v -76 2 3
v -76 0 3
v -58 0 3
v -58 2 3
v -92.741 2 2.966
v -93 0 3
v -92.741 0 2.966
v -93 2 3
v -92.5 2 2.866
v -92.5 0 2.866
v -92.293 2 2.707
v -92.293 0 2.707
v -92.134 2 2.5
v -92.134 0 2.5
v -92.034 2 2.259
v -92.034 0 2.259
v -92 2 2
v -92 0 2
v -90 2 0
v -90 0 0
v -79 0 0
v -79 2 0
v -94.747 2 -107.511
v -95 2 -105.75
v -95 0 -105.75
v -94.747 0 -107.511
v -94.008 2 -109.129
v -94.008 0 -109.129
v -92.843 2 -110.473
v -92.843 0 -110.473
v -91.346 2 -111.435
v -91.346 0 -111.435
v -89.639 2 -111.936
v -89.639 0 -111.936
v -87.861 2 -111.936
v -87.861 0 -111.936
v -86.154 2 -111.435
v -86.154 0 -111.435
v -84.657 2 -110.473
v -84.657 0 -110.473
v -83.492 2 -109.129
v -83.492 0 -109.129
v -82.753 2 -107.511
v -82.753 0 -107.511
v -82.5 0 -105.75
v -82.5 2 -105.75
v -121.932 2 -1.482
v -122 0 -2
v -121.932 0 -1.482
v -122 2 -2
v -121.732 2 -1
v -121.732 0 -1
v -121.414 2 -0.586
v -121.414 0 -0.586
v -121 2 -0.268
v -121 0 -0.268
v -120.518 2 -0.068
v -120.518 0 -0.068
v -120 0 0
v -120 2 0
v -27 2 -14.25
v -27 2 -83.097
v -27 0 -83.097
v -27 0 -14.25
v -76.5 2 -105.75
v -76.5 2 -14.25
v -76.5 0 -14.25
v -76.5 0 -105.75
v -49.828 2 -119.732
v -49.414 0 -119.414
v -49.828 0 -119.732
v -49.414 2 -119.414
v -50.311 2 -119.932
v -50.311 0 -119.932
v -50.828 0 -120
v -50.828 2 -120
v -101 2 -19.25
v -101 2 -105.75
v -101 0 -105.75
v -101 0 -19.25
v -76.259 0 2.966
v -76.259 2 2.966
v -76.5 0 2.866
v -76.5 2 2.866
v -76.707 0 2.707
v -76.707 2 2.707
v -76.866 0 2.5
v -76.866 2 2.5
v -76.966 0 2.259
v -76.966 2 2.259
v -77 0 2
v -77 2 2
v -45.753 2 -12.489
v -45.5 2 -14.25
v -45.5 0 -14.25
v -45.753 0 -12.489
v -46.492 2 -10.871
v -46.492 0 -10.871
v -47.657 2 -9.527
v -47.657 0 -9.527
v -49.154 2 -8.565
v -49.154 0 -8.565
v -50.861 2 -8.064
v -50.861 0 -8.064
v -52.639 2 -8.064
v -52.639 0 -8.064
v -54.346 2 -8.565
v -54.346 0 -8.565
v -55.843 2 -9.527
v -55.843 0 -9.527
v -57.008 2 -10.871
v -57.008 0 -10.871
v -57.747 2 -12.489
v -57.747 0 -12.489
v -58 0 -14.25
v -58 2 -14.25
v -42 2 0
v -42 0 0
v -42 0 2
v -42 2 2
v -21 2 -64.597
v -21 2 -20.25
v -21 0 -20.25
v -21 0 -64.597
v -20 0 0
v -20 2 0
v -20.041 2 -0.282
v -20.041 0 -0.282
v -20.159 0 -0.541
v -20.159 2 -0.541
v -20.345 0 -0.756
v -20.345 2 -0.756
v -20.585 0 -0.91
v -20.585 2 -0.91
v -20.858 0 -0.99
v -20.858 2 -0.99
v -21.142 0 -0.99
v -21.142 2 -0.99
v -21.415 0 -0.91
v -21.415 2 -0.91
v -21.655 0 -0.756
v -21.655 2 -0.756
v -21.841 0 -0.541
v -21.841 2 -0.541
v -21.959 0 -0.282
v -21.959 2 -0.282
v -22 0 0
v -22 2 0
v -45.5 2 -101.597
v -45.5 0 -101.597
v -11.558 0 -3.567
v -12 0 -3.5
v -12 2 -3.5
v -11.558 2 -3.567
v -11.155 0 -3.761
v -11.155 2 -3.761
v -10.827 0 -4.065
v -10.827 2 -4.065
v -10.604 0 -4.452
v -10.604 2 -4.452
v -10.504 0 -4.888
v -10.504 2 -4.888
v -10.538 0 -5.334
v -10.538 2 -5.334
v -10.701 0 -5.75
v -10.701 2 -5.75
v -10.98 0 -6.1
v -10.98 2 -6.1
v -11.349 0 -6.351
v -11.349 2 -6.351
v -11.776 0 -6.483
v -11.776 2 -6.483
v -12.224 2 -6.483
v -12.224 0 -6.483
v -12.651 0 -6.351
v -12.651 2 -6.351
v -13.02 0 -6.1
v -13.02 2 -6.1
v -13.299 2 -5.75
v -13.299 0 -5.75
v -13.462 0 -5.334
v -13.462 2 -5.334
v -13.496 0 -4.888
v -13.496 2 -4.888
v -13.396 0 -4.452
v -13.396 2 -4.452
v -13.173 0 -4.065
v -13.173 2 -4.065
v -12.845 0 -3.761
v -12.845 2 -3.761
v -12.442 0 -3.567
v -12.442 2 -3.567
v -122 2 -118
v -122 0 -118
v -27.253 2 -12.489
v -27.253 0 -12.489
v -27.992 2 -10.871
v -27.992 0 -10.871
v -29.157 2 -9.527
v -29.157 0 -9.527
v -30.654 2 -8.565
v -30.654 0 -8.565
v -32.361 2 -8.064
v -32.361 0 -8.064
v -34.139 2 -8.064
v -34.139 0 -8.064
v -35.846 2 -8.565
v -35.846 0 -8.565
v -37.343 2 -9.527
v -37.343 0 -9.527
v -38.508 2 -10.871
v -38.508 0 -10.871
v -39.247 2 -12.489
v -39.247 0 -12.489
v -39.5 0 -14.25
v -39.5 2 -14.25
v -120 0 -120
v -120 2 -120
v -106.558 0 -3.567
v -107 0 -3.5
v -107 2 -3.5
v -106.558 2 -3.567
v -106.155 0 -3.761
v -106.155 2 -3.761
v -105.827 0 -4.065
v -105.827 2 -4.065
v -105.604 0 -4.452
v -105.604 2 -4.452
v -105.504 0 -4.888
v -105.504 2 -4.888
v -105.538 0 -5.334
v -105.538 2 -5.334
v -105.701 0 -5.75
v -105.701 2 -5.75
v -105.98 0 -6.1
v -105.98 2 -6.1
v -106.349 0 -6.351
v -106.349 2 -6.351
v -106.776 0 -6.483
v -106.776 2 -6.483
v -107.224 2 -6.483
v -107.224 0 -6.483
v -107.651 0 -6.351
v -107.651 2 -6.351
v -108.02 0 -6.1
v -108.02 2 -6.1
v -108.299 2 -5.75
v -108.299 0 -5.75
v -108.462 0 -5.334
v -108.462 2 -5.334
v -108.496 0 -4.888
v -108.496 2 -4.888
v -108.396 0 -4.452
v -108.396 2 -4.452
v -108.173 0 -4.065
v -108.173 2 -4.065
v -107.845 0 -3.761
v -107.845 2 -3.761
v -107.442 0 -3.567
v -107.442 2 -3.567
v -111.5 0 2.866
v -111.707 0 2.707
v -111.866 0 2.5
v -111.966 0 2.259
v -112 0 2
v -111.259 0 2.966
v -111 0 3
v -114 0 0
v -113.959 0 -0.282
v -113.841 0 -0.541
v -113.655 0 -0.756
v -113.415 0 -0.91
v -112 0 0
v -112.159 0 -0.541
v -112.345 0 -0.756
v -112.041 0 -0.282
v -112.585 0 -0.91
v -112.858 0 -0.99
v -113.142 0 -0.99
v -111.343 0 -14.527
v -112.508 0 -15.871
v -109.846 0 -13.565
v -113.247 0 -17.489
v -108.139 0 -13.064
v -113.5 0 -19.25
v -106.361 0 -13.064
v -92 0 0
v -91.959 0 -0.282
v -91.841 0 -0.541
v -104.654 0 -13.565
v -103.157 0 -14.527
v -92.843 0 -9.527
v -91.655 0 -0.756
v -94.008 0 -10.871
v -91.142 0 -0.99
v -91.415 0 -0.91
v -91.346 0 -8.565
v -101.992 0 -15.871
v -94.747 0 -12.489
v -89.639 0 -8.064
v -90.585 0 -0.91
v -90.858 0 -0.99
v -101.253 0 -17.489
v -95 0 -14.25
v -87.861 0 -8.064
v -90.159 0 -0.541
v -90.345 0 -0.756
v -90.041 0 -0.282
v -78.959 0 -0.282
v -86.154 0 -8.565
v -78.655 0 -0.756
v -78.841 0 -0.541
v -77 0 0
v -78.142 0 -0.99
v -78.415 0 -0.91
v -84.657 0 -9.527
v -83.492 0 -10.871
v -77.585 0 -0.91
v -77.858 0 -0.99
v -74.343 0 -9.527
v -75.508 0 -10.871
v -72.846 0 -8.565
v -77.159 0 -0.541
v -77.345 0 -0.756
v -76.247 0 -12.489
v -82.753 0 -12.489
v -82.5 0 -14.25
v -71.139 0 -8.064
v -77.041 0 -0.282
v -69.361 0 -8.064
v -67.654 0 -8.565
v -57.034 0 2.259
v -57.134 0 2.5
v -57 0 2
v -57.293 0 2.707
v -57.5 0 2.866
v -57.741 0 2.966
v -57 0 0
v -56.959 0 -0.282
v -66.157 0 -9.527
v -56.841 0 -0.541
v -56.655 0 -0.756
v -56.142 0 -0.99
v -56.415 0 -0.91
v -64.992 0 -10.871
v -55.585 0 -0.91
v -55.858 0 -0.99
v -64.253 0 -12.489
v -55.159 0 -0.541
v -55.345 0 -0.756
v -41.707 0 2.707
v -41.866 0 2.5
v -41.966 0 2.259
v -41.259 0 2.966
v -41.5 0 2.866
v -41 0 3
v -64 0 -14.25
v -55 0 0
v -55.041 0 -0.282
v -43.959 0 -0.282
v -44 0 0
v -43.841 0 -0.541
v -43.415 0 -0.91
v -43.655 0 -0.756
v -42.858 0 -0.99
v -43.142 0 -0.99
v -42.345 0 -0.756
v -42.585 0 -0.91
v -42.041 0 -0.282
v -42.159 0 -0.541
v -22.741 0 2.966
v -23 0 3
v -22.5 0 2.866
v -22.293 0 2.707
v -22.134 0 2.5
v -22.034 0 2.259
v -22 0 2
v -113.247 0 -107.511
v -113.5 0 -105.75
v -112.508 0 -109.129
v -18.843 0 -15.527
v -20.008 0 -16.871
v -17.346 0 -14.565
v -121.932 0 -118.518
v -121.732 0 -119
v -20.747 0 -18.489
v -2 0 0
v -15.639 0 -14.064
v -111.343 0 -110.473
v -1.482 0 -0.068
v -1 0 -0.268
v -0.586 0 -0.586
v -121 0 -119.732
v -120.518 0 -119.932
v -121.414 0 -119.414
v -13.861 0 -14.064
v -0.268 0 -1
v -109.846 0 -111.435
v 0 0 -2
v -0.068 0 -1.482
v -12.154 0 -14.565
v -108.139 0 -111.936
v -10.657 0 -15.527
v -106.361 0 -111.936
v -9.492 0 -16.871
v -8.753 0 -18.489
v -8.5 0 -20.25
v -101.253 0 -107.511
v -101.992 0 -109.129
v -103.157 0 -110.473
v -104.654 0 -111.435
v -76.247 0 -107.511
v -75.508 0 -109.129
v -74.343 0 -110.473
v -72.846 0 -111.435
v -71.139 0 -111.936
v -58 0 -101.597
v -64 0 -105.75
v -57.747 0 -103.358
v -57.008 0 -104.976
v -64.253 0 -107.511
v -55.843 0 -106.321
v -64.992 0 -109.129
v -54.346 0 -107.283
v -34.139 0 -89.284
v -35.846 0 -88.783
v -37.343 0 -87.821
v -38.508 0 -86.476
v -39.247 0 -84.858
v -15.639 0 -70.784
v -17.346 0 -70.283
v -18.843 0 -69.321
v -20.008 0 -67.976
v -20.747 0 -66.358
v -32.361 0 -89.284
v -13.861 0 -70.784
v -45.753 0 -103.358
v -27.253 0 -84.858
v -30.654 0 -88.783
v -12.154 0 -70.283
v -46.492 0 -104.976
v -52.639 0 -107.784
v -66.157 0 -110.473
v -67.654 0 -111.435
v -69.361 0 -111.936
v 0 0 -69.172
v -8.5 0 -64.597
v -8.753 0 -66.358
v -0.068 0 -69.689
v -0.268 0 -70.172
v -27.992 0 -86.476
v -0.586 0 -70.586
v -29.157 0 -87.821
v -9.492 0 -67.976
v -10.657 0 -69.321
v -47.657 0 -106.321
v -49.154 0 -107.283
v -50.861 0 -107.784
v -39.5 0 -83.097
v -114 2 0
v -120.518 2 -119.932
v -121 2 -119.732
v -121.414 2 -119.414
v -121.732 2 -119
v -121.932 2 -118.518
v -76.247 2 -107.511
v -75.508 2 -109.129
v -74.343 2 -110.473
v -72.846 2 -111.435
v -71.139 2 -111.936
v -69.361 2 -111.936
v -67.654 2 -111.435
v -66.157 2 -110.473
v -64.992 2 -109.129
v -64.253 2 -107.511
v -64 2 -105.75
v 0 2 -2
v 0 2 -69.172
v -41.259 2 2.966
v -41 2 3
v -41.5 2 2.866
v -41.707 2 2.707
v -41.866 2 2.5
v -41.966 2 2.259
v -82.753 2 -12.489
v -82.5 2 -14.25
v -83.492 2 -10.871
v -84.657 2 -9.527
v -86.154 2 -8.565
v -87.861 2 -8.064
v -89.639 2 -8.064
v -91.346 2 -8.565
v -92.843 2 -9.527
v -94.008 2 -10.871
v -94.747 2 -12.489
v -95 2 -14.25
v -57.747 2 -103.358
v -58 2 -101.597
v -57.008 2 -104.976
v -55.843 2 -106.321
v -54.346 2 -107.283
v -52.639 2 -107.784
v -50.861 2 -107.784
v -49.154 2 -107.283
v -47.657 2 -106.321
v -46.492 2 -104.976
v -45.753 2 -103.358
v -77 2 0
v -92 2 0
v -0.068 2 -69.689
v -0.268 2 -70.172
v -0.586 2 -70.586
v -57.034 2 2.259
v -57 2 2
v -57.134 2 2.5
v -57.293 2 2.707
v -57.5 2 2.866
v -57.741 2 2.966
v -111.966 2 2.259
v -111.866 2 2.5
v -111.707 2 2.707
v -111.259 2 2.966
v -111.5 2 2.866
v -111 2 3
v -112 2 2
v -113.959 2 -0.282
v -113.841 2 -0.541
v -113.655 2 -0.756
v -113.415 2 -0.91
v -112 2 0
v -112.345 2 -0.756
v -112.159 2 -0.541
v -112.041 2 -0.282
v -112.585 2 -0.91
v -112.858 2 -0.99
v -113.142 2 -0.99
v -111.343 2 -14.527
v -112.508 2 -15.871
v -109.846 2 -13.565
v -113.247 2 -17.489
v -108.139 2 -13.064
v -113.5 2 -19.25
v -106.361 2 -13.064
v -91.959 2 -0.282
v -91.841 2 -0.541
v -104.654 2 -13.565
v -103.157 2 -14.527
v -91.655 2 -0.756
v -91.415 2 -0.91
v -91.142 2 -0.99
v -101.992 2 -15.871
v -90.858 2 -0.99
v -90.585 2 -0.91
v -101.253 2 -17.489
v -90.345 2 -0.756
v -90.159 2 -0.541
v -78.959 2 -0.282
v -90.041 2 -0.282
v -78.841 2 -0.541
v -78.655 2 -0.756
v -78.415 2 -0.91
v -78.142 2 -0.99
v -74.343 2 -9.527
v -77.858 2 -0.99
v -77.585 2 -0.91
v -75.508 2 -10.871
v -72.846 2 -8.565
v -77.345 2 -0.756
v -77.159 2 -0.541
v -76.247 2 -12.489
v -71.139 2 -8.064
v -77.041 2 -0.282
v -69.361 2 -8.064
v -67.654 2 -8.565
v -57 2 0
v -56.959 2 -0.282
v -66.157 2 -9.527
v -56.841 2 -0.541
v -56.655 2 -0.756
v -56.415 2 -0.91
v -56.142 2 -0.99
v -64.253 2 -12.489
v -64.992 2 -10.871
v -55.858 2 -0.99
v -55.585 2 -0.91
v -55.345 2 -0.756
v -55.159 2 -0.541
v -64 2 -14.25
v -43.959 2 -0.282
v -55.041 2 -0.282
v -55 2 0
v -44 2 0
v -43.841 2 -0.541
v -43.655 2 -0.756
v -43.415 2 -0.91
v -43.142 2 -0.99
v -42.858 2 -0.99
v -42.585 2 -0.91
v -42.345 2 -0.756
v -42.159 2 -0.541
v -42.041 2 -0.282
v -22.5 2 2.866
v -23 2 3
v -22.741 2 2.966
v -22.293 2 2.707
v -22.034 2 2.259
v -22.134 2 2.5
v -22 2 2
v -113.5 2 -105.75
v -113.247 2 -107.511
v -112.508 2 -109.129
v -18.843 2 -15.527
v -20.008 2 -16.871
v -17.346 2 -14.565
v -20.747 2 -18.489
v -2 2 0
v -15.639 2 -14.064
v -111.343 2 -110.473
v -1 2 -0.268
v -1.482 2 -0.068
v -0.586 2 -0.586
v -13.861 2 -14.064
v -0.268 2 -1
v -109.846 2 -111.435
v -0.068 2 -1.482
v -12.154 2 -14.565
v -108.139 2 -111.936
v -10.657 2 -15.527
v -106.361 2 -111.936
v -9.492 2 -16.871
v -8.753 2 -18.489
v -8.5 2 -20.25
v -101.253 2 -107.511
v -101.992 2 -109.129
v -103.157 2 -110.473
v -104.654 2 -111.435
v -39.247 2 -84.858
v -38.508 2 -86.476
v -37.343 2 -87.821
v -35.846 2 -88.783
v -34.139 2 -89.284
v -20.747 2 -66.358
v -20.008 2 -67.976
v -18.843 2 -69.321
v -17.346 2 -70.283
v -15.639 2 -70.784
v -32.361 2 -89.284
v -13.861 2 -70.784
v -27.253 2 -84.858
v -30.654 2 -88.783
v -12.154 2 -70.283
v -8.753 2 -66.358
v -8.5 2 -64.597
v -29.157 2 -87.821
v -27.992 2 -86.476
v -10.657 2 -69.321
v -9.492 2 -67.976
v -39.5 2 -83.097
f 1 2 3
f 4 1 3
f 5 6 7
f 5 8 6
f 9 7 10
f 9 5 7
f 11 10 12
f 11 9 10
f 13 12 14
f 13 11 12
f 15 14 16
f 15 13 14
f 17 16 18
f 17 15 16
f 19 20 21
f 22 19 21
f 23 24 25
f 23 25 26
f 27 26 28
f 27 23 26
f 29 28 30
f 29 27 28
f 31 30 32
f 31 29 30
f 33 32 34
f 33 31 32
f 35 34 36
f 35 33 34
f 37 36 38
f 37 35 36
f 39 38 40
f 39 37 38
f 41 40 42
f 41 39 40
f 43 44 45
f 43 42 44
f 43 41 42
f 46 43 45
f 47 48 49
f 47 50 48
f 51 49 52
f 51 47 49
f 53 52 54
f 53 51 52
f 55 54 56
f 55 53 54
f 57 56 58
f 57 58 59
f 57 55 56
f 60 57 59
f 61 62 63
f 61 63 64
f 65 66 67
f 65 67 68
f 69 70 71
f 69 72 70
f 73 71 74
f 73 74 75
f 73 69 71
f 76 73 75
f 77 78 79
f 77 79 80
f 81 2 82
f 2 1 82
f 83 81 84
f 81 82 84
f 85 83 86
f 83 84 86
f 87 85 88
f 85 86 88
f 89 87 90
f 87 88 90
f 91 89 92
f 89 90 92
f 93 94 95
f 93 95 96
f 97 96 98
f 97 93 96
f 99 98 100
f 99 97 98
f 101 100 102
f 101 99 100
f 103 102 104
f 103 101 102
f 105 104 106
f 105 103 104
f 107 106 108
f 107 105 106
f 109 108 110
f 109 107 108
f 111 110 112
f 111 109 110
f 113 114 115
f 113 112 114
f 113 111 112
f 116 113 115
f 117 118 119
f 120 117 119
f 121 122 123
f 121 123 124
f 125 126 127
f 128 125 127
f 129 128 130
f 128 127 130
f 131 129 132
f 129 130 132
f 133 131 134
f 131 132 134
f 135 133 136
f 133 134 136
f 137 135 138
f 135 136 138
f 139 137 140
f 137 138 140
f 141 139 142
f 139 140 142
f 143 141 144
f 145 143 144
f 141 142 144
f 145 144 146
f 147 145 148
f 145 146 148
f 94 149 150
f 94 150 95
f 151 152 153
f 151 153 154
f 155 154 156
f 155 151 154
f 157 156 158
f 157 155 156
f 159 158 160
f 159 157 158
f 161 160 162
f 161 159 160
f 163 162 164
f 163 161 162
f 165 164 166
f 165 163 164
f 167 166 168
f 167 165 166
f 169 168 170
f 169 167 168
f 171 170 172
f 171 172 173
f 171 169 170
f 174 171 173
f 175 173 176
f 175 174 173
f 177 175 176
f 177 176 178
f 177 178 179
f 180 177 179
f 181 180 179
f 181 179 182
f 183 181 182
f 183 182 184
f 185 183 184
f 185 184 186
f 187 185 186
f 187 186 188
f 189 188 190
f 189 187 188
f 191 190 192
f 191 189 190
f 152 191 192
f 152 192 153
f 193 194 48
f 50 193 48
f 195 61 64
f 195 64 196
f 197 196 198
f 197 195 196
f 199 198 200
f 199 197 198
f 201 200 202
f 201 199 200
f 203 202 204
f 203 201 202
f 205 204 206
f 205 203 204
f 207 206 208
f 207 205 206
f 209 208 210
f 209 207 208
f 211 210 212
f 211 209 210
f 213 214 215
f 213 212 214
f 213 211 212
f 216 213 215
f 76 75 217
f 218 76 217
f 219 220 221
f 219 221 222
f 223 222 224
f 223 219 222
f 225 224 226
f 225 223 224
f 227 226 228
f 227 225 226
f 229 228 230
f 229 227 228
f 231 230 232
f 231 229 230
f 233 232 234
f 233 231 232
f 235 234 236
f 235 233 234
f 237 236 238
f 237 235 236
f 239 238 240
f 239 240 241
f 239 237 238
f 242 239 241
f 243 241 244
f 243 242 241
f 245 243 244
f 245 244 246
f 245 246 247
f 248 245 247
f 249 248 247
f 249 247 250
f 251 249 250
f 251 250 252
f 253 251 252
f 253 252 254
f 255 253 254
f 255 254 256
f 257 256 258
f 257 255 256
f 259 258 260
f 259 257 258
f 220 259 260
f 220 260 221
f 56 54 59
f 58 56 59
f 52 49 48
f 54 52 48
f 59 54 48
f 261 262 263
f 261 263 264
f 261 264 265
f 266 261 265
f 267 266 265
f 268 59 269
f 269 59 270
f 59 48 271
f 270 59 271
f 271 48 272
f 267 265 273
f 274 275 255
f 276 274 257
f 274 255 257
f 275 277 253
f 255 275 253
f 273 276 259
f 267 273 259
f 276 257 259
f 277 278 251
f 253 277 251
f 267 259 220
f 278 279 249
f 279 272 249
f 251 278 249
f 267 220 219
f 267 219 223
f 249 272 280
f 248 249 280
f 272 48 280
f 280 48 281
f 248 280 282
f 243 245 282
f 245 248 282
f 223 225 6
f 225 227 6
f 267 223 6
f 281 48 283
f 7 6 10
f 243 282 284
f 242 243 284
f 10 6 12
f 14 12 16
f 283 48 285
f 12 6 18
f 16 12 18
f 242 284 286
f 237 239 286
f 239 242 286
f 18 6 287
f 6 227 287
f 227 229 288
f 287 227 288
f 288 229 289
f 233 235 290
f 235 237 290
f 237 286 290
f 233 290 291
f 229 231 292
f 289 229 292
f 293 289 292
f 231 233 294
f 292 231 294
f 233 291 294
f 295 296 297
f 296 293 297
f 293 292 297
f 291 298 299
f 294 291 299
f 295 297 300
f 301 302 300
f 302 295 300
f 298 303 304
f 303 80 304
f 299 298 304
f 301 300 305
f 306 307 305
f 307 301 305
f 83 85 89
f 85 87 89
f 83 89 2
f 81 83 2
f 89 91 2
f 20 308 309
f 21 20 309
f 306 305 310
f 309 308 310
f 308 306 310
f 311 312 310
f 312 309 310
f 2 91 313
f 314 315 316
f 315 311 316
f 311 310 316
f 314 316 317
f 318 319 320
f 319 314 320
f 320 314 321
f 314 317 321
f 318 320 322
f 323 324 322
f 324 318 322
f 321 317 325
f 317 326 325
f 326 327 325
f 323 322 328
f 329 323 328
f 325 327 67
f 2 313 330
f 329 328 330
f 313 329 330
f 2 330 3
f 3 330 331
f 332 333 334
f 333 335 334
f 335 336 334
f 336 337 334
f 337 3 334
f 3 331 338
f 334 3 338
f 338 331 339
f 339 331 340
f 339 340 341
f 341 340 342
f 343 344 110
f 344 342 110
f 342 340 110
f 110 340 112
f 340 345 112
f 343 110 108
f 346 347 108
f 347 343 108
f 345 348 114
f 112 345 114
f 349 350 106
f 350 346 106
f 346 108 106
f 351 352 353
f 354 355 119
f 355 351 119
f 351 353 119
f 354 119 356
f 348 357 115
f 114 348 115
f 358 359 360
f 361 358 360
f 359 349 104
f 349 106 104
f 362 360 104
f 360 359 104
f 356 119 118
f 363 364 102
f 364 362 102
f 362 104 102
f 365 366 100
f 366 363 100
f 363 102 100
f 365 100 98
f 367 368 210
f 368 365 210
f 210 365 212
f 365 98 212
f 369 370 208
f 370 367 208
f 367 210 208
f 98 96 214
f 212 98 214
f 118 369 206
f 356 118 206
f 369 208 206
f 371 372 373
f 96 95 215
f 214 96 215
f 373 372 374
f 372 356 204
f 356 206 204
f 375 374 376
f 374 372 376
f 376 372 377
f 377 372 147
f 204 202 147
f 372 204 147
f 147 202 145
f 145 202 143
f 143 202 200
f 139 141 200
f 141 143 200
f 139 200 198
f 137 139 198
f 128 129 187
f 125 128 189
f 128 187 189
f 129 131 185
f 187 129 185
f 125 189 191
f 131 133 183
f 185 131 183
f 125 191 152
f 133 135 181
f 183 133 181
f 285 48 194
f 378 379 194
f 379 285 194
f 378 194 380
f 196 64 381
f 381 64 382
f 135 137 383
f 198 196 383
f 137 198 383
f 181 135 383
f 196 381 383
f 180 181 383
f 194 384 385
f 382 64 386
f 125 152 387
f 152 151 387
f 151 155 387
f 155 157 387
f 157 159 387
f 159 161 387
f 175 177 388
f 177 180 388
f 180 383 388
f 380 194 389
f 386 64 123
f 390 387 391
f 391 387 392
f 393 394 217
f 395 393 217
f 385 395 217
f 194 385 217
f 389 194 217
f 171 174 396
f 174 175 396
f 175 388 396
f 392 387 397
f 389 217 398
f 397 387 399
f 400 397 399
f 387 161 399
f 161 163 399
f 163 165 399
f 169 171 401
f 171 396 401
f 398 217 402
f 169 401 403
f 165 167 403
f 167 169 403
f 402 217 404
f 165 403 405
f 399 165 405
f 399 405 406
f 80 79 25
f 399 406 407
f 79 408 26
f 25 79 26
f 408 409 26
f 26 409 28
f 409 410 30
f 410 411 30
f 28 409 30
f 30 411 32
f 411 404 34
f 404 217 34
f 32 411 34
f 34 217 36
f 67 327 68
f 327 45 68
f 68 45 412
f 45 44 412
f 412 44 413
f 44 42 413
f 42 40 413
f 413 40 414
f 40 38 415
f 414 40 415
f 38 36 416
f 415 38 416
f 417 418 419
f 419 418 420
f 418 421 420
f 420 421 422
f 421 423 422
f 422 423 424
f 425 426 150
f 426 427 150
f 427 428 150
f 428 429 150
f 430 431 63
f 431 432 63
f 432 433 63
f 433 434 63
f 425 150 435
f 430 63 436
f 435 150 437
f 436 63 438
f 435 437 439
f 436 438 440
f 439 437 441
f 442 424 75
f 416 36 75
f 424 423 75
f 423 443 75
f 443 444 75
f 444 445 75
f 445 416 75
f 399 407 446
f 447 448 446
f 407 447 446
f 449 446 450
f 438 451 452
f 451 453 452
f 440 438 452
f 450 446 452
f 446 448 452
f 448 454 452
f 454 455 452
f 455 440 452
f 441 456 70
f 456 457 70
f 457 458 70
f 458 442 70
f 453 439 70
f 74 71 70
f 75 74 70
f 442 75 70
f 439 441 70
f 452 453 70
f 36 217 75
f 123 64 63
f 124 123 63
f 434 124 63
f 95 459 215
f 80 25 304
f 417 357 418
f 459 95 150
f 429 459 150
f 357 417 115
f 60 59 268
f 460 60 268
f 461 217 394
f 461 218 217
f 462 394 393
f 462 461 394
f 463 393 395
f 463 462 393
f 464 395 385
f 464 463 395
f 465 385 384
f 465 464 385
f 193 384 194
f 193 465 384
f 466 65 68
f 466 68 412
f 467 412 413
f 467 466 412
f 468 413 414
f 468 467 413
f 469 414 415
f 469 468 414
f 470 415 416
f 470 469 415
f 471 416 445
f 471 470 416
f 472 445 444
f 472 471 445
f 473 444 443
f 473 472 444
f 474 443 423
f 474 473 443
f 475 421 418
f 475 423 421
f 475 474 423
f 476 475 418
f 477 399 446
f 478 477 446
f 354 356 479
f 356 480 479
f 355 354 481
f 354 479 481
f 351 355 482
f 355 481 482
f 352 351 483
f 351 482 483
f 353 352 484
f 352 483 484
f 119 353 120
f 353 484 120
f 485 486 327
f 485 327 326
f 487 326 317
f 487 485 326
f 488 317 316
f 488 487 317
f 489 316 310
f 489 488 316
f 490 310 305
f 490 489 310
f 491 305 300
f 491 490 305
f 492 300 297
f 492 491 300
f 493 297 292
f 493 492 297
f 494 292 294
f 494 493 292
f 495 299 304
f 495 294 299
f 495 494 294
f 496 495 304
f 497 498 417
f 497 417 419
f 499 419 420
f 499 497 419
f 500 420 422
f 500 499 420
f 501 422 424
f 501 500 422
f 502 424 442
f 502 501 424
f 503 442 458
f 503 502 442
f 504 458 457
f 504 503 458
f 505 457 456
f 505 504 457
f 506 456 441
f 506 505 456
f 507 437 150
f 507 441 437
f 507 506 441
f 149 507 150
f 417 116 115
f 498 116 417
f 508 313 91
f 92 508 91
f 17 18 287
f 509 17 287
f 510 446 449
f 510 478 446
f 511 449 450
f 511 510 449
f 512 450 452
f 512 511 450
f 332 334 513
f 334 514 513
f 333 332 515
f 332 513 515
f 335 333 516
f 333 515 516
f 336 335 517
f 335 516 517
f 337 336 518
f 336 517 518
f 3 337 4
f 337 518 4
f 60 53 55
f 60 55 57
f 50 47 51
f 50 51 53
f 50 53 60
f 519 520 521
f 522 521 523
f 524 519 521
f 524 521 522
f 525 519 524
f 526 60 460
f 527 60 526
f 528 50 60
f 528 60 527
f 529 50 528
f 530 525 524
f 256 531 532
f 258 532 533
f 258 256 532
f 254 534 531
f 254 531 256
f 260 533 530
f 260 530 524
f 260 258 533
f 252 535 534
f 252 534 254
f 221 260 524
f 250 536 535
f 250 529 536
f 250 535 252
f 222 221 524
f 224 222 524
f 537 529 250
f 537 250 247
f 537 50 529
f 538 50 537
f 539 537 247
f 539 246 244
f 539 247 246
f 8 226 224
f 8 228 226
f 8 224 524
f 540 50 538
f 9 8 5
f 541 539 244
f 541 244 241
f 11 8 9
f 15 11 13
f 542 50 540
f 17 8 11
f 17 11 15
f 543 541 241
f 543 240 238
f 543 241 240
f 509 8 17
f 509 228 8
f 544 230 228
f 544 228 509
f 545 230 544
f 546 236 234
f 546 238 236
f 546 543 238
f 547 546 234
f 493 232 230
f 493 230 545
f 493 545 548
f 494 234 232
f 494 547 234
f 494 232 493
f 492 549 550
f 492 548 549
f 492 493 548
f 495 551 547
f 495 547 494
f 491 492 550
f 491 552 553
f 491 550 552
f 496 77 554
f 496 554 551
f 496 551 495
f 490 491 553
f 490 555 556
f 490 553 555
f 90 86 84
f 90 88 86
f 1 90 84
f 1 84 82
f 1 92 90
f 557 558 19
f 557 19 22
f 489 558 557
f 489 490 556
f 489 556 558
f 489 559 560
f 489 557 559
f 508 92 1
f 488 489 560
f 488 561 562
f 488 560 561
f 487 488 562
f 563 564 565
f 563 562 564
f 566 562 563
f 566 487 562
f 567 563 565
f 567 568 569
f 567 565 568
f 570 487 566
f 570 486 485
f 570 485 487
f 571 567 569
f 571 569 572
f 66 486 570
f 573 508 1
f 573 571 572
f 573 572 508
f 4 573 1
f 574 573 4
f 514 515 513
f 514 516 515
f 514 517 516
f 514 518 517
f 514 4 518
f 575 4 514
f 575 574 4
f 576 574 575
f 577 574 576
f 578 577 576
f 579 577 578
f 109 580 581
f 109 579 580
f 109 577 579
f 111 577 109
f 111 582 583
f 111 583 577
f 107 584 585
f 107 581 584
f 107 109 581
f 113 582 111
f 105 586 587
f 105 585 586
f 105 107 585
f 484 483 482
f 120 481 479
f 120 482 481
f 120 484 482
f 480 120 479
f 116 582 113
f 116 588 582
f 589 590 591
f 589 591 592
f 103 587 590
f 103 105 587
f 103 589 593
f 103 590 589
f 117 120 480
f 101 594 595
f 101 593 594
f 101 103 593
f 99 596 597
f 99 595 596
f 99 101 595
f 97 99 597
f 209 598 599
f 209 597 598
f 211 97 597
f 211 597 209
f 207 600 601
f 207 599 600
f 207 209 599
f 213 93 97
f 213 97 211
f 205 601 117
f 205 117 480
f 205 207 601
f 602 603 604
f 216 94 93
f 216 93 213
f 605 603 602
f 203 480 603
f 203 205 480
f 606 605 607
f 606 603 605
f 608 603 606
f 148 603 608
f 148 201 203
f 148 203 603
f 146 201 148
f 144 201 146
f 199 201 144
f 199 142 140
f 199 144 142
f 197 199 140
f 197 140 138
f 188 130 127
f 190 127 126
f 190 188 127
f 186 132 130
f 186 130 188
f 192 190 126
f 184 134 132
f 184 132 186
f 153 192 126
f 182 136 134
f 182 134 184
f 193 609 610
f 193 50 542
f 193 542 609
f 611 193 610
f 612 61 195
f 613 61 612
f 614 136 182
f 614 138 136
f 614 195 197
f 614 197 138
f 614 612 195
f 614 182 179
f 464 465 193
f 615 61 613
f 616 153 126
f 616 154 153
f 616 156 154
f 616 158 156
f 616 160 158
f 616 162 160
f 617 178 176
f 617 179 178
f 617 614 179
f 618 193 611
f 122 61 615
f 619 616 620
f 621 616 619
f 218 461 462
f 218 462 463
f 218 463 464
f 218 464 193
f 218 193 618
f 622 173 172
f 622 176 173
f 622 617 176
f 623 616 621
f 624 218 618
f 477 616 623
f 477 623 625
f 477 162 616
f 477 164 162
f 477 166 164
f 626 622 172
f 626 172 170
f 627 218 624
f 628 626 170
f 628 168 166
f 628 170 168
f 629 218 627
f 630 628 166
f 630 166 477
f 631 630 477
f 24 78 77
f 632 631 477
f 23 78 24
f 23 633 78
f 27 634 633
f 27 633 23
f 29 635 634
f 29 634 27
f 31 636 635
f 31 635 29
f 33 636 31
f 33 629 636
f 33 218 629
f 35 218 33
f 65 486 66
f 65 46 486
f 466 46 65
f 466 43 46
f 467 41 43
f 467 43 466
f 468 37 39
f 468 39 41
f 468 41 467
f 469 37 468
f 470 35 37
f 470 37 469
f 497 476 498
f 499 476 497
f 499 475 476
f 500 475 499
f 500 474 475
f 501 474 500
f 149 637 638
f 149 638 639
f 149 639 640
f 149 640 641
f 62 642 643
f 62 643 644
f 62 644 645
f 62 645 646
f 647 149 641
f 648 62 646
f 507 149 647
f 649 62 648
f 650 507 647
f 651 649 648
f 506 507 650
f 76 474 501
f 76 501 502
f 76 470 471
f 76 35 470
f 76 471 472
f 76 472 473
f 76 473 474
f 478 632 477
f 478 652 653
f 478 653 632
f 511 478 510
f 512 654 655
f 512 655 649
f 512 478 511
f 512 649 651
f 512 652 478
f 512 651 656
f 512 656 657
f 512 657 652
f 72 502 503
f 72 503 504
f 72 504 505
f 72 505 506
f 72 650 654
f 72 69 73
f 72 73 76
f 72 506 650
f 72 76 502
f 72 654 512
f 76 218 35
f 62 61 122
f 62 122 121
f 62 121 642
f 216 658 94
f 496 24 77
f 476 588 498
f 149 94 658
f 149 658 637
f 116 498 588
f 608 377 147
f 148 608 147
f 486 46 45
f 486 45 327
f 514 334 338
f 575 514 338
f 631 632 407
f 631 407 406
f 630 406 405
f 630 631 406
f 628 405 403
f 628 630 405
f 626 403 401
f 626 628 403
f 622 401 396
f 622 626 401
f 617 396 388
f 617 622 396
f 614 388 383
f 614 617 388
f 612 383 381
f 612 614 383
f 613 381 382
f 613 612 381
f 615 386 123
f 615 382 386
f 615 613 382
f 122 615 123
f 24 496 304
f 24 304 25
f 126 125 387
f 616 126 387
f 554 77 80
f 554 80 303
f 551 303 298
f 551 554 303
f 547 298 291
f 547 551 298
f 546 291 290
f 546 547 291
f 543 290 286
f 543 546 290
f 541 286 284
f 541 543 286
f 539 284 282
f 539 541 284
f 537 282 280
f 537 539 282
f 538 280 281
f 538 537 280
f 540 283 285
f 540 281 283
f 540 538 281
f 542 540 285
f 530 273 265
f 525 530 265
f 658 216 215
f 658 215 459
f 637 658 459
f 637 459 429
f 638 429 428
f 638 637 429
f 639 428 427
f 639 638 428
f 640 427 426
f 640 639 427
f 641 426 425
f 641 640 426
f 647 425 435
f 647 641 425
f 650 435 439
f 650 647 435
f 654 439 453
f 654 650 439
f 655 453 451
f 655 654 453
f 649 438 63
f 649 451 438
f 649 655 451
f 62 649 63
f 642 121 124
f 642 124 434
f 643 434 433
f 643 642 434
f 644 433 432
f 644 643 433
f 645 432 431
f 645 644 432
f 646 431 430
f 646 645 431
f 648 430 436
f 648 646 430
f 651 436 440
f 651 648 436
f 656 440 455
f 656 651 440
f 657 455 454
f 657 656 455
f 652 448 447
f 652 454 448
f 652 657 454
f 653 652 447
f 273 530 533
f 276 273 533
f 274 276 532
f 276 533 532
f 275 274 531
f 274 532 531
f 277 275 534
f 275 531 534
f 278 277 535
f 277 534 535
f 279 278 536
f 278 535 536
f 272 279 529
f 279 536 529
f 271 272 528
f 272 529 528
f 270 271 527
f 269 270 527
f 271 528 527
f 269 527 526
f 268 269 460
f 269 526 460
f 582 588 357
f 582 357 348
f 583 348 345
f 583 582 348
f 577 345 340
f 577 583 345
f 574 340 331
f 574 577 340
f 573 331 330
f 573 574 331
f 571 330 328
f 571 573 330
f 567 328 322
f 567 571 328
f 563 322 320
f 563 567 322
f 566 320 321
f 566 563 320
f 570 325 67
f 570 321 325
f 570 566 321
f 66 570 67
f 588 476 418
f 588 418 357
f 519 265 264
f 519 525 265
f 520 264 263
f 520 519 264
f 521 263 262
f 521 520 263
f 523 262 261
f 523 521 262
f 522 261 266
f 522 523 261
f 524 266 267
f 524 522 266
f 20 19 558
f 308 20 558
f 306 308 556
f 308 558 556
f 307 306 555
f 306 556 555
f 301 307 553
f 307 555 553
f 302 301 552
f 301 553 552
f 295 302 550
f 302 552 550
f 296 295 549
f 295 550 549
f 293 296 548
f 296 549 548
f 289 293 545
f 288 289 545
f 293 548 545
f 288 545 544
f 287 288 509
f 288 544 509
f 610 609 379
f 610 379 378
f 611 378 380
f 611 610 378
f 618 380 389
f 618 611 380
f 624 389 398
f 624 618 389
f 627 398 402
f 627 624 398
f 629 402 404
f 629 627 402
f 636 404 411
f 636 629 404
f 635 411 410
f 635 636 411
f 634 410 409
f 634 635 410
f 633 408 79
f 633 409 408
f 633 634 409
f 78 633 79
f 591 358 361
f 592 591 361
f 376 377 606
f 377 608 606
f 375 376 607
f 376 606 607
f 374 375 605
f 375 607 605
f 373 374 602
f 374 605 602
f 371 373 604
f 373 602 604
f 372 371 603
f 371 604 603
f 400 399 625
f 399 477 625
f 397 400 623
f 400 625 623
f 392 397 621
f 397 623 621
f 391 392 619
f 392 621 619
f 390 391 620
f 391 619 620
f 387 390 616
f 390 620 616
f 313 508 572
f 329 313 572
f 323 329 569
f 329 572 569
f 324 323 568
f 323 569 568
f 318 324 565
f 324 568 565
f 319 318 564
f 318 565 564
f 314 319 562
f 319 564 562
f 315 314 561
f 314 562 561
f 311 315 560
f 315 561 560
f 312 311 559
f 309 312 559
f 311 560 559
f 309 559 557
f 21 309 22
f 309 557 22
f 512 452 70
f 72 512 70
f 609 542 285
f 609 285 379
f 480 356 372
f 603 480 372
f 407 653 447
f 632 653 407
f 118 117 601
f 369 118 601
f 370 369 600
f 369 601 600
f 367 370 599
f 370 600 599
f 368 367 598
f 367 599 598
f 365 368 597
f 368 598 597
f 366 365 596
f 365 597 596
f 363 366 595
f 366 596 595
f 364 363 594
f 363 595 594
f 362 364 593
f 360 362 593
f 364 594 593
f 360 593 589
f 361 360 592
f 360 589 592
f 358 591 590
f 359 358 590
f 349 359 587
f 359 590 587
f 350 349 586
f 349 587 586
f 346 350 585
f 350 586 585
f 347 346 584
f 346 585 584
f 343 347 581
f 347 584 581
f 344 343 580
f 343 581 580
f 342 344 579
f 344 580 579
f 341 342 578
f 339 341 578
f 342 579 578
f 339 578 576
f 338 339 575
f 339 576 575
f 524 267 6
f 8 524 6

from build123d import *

# Parameters (mm, degrees)
SKETCH_1_R          = 1.5
EXTRUDE_1_DEPTH     = 2
SKETCH_2_R          = 1
CUT_EXTRUDE_1_DEPTH = 172.137371722
CUT_EXTRUDE_2_DEPTH = 172.137371722
FILLET_1_R          = 2
FILLET_2_R          = 1


with BuildPart() as part:
    # 草图1 → 凸台-拉伸1 (new body)
    with BuildSketch(Plane(origin=(0, 0, 0), x_dir=(1, 0, 0), z_dir=(0, 1, 0))):
        Polygon((0, 0), (0, 70), (-50, 120), (-122, 120), (-122, 0), (-112, 0), (-112, -3), (-92, -3), (-92, 0), (-77, 0), (-77, -3), (-57, -3), (-57, 0), (-42, 0), (-42, -3), (-22, -3), (-22, 0), align=None)
        with Locations(Location((-12, 5, 0), (0, 0, 270))):
            Circle(SKETCH_1_R, mode=Mode.SUBTRACT)
        with Locations(Location((-107, 5, 0), (0, 0, 270))):
            Circle(SKETCH_1_R, mode=Mode.SUBTRACT)
    extrude(amount=EXTRUDE_1_DEPTH)

    # 草图2 → 切除-拉伸1 (cut, through all)
    with BuildSketch(Plane(origin=(0, 2, 0), x_dir=(1, 0, 0), z_dir=(0, 1, 0))):
        with Locations((-113, 0)):
            Circle(SKETCH_2_R)
        with Locations((-91, 0)):
            Circle(SKETCH_2_R)
        with Locations((-78, 0)):
            Circle(SKETCH_2_R)
        with Locations((-56, 0)):
            Circle(SKETCH_2_R)
        with Locations((-43, 0)):
            Circle(SKETCH_2_R)
        with Locations((-21, 0)):
            Circle(SKETCH_2_R)
    extrude(amount=-CUT_EXTRUDE_1_DEPTH, mode=Mode.SUBTRACT)

    # 草图3 → 切除-拉伸2 (cut, through all)
    with BuildSketch(Plane(origin=(0, 2, 0), x_dir=(1, 0, 0), z_dir=(0, 1, 0))):
        with BuildLine():
            Line((-101, 105.75), (-101, 19.25))
            ThreePointArc((-101, 19.25), (-107.25, 13), (-113.5, 19.25))
            Line((-113.5, 19.25), (-113.5, 105.75))
            ThreePointArc((-113.5, 105.75), (-107.25, 112), (-101, 105.75))
        make_face()
        with BuildLine():
            Line((-82.5, 105.75), (-82.5, 14.25))
            ThreePointArc((-82.5, 14.25), (-88.75, 8), (-95, 14.25))
            Line((-95, 14.25), (-95, 105.75))
            ThreePointArc((-95, 105.75), (-88.75, 112), (-82.5, 105.75))
        make_face()
        with BuildLine():
            Line((-64, 105.75), (-64, 14.25))
            ThreePointArc((-64, 14.25), (-70.25, 8), (-76.5, 14.25))
            Line((-76.5, 14.25), (-76.5, 105.75))
            ThreePointArc((-76.5, 105.75), (-70.25, 112), (-64, 105.75))
        make_face()
        with BuildLine():
            Line((-45.5, 101.597456736), (-45.5, 14.25))
            ThreePointArc((-45.5, 14.25), (-51.75, 8), (-58, 14.25))
            Line((-58, 14.25), (-58, 101.597456736))
            ThreePointArc((-58, 101.597456736), (-51.75, 107.847456736), (-45.5, 101.597456736))
        make_face()
        with BuildLine():
            Line((-27, 83.097456736), (-27, 14.25))
            ThreePointArc((-27, 14.25), (-33.25, 8), (-39.5, 14.25))
            Line((-39.5, 14.25), (-39.5, 83.097456736))
            ThreePointArc((-39.5, 83.097456736), (-33.25, 89.347456736), (-27, 83.097456736))
        make_face()
        with BuildLine():
            Line((-8.5, 64.597456736), (-8.5, 20.25))
            ThreePointArc((-8.5, 20.25), (-14.75, 14), (-21, 20.25))
            Line((-21, 20.25), (-21, 64.597456736))
            ThreePointArc((-21, 64.597456736), (-14.75, 70.847456736), (-8.5, 64.597456736))
        make_face()
    extrude(amount=-CUT_EXTRUDE_2_DEPTH, mode=Mode.SUBTRACT)

    # 圆角1
    fillet_1_edges = [part.edges().sort_by_distance(p)[0] for p in [
        (-122, 1, 0),
        (-122, 1, -120),
        (-50, 1, -120),
        (0, 1, -70),
        (0, 1, 0),
    ]]
    fillet(fillet_1_edges, radius=FILLET_1_R)

    # 圆角2
    fillet_2_edges = [part.edges().sort_by_distance(p)[0] for p in [
        (-22, 1, 3),
        (-42, 1, 3),
        (-57, 1, 3),
        (-77, 1, 3),
        (-92, 1, 3),
        (-112, 1, 3),
    ]]
    fillet(fillet_2_edges, radius=FILLET_2_R)


solid = part.part
